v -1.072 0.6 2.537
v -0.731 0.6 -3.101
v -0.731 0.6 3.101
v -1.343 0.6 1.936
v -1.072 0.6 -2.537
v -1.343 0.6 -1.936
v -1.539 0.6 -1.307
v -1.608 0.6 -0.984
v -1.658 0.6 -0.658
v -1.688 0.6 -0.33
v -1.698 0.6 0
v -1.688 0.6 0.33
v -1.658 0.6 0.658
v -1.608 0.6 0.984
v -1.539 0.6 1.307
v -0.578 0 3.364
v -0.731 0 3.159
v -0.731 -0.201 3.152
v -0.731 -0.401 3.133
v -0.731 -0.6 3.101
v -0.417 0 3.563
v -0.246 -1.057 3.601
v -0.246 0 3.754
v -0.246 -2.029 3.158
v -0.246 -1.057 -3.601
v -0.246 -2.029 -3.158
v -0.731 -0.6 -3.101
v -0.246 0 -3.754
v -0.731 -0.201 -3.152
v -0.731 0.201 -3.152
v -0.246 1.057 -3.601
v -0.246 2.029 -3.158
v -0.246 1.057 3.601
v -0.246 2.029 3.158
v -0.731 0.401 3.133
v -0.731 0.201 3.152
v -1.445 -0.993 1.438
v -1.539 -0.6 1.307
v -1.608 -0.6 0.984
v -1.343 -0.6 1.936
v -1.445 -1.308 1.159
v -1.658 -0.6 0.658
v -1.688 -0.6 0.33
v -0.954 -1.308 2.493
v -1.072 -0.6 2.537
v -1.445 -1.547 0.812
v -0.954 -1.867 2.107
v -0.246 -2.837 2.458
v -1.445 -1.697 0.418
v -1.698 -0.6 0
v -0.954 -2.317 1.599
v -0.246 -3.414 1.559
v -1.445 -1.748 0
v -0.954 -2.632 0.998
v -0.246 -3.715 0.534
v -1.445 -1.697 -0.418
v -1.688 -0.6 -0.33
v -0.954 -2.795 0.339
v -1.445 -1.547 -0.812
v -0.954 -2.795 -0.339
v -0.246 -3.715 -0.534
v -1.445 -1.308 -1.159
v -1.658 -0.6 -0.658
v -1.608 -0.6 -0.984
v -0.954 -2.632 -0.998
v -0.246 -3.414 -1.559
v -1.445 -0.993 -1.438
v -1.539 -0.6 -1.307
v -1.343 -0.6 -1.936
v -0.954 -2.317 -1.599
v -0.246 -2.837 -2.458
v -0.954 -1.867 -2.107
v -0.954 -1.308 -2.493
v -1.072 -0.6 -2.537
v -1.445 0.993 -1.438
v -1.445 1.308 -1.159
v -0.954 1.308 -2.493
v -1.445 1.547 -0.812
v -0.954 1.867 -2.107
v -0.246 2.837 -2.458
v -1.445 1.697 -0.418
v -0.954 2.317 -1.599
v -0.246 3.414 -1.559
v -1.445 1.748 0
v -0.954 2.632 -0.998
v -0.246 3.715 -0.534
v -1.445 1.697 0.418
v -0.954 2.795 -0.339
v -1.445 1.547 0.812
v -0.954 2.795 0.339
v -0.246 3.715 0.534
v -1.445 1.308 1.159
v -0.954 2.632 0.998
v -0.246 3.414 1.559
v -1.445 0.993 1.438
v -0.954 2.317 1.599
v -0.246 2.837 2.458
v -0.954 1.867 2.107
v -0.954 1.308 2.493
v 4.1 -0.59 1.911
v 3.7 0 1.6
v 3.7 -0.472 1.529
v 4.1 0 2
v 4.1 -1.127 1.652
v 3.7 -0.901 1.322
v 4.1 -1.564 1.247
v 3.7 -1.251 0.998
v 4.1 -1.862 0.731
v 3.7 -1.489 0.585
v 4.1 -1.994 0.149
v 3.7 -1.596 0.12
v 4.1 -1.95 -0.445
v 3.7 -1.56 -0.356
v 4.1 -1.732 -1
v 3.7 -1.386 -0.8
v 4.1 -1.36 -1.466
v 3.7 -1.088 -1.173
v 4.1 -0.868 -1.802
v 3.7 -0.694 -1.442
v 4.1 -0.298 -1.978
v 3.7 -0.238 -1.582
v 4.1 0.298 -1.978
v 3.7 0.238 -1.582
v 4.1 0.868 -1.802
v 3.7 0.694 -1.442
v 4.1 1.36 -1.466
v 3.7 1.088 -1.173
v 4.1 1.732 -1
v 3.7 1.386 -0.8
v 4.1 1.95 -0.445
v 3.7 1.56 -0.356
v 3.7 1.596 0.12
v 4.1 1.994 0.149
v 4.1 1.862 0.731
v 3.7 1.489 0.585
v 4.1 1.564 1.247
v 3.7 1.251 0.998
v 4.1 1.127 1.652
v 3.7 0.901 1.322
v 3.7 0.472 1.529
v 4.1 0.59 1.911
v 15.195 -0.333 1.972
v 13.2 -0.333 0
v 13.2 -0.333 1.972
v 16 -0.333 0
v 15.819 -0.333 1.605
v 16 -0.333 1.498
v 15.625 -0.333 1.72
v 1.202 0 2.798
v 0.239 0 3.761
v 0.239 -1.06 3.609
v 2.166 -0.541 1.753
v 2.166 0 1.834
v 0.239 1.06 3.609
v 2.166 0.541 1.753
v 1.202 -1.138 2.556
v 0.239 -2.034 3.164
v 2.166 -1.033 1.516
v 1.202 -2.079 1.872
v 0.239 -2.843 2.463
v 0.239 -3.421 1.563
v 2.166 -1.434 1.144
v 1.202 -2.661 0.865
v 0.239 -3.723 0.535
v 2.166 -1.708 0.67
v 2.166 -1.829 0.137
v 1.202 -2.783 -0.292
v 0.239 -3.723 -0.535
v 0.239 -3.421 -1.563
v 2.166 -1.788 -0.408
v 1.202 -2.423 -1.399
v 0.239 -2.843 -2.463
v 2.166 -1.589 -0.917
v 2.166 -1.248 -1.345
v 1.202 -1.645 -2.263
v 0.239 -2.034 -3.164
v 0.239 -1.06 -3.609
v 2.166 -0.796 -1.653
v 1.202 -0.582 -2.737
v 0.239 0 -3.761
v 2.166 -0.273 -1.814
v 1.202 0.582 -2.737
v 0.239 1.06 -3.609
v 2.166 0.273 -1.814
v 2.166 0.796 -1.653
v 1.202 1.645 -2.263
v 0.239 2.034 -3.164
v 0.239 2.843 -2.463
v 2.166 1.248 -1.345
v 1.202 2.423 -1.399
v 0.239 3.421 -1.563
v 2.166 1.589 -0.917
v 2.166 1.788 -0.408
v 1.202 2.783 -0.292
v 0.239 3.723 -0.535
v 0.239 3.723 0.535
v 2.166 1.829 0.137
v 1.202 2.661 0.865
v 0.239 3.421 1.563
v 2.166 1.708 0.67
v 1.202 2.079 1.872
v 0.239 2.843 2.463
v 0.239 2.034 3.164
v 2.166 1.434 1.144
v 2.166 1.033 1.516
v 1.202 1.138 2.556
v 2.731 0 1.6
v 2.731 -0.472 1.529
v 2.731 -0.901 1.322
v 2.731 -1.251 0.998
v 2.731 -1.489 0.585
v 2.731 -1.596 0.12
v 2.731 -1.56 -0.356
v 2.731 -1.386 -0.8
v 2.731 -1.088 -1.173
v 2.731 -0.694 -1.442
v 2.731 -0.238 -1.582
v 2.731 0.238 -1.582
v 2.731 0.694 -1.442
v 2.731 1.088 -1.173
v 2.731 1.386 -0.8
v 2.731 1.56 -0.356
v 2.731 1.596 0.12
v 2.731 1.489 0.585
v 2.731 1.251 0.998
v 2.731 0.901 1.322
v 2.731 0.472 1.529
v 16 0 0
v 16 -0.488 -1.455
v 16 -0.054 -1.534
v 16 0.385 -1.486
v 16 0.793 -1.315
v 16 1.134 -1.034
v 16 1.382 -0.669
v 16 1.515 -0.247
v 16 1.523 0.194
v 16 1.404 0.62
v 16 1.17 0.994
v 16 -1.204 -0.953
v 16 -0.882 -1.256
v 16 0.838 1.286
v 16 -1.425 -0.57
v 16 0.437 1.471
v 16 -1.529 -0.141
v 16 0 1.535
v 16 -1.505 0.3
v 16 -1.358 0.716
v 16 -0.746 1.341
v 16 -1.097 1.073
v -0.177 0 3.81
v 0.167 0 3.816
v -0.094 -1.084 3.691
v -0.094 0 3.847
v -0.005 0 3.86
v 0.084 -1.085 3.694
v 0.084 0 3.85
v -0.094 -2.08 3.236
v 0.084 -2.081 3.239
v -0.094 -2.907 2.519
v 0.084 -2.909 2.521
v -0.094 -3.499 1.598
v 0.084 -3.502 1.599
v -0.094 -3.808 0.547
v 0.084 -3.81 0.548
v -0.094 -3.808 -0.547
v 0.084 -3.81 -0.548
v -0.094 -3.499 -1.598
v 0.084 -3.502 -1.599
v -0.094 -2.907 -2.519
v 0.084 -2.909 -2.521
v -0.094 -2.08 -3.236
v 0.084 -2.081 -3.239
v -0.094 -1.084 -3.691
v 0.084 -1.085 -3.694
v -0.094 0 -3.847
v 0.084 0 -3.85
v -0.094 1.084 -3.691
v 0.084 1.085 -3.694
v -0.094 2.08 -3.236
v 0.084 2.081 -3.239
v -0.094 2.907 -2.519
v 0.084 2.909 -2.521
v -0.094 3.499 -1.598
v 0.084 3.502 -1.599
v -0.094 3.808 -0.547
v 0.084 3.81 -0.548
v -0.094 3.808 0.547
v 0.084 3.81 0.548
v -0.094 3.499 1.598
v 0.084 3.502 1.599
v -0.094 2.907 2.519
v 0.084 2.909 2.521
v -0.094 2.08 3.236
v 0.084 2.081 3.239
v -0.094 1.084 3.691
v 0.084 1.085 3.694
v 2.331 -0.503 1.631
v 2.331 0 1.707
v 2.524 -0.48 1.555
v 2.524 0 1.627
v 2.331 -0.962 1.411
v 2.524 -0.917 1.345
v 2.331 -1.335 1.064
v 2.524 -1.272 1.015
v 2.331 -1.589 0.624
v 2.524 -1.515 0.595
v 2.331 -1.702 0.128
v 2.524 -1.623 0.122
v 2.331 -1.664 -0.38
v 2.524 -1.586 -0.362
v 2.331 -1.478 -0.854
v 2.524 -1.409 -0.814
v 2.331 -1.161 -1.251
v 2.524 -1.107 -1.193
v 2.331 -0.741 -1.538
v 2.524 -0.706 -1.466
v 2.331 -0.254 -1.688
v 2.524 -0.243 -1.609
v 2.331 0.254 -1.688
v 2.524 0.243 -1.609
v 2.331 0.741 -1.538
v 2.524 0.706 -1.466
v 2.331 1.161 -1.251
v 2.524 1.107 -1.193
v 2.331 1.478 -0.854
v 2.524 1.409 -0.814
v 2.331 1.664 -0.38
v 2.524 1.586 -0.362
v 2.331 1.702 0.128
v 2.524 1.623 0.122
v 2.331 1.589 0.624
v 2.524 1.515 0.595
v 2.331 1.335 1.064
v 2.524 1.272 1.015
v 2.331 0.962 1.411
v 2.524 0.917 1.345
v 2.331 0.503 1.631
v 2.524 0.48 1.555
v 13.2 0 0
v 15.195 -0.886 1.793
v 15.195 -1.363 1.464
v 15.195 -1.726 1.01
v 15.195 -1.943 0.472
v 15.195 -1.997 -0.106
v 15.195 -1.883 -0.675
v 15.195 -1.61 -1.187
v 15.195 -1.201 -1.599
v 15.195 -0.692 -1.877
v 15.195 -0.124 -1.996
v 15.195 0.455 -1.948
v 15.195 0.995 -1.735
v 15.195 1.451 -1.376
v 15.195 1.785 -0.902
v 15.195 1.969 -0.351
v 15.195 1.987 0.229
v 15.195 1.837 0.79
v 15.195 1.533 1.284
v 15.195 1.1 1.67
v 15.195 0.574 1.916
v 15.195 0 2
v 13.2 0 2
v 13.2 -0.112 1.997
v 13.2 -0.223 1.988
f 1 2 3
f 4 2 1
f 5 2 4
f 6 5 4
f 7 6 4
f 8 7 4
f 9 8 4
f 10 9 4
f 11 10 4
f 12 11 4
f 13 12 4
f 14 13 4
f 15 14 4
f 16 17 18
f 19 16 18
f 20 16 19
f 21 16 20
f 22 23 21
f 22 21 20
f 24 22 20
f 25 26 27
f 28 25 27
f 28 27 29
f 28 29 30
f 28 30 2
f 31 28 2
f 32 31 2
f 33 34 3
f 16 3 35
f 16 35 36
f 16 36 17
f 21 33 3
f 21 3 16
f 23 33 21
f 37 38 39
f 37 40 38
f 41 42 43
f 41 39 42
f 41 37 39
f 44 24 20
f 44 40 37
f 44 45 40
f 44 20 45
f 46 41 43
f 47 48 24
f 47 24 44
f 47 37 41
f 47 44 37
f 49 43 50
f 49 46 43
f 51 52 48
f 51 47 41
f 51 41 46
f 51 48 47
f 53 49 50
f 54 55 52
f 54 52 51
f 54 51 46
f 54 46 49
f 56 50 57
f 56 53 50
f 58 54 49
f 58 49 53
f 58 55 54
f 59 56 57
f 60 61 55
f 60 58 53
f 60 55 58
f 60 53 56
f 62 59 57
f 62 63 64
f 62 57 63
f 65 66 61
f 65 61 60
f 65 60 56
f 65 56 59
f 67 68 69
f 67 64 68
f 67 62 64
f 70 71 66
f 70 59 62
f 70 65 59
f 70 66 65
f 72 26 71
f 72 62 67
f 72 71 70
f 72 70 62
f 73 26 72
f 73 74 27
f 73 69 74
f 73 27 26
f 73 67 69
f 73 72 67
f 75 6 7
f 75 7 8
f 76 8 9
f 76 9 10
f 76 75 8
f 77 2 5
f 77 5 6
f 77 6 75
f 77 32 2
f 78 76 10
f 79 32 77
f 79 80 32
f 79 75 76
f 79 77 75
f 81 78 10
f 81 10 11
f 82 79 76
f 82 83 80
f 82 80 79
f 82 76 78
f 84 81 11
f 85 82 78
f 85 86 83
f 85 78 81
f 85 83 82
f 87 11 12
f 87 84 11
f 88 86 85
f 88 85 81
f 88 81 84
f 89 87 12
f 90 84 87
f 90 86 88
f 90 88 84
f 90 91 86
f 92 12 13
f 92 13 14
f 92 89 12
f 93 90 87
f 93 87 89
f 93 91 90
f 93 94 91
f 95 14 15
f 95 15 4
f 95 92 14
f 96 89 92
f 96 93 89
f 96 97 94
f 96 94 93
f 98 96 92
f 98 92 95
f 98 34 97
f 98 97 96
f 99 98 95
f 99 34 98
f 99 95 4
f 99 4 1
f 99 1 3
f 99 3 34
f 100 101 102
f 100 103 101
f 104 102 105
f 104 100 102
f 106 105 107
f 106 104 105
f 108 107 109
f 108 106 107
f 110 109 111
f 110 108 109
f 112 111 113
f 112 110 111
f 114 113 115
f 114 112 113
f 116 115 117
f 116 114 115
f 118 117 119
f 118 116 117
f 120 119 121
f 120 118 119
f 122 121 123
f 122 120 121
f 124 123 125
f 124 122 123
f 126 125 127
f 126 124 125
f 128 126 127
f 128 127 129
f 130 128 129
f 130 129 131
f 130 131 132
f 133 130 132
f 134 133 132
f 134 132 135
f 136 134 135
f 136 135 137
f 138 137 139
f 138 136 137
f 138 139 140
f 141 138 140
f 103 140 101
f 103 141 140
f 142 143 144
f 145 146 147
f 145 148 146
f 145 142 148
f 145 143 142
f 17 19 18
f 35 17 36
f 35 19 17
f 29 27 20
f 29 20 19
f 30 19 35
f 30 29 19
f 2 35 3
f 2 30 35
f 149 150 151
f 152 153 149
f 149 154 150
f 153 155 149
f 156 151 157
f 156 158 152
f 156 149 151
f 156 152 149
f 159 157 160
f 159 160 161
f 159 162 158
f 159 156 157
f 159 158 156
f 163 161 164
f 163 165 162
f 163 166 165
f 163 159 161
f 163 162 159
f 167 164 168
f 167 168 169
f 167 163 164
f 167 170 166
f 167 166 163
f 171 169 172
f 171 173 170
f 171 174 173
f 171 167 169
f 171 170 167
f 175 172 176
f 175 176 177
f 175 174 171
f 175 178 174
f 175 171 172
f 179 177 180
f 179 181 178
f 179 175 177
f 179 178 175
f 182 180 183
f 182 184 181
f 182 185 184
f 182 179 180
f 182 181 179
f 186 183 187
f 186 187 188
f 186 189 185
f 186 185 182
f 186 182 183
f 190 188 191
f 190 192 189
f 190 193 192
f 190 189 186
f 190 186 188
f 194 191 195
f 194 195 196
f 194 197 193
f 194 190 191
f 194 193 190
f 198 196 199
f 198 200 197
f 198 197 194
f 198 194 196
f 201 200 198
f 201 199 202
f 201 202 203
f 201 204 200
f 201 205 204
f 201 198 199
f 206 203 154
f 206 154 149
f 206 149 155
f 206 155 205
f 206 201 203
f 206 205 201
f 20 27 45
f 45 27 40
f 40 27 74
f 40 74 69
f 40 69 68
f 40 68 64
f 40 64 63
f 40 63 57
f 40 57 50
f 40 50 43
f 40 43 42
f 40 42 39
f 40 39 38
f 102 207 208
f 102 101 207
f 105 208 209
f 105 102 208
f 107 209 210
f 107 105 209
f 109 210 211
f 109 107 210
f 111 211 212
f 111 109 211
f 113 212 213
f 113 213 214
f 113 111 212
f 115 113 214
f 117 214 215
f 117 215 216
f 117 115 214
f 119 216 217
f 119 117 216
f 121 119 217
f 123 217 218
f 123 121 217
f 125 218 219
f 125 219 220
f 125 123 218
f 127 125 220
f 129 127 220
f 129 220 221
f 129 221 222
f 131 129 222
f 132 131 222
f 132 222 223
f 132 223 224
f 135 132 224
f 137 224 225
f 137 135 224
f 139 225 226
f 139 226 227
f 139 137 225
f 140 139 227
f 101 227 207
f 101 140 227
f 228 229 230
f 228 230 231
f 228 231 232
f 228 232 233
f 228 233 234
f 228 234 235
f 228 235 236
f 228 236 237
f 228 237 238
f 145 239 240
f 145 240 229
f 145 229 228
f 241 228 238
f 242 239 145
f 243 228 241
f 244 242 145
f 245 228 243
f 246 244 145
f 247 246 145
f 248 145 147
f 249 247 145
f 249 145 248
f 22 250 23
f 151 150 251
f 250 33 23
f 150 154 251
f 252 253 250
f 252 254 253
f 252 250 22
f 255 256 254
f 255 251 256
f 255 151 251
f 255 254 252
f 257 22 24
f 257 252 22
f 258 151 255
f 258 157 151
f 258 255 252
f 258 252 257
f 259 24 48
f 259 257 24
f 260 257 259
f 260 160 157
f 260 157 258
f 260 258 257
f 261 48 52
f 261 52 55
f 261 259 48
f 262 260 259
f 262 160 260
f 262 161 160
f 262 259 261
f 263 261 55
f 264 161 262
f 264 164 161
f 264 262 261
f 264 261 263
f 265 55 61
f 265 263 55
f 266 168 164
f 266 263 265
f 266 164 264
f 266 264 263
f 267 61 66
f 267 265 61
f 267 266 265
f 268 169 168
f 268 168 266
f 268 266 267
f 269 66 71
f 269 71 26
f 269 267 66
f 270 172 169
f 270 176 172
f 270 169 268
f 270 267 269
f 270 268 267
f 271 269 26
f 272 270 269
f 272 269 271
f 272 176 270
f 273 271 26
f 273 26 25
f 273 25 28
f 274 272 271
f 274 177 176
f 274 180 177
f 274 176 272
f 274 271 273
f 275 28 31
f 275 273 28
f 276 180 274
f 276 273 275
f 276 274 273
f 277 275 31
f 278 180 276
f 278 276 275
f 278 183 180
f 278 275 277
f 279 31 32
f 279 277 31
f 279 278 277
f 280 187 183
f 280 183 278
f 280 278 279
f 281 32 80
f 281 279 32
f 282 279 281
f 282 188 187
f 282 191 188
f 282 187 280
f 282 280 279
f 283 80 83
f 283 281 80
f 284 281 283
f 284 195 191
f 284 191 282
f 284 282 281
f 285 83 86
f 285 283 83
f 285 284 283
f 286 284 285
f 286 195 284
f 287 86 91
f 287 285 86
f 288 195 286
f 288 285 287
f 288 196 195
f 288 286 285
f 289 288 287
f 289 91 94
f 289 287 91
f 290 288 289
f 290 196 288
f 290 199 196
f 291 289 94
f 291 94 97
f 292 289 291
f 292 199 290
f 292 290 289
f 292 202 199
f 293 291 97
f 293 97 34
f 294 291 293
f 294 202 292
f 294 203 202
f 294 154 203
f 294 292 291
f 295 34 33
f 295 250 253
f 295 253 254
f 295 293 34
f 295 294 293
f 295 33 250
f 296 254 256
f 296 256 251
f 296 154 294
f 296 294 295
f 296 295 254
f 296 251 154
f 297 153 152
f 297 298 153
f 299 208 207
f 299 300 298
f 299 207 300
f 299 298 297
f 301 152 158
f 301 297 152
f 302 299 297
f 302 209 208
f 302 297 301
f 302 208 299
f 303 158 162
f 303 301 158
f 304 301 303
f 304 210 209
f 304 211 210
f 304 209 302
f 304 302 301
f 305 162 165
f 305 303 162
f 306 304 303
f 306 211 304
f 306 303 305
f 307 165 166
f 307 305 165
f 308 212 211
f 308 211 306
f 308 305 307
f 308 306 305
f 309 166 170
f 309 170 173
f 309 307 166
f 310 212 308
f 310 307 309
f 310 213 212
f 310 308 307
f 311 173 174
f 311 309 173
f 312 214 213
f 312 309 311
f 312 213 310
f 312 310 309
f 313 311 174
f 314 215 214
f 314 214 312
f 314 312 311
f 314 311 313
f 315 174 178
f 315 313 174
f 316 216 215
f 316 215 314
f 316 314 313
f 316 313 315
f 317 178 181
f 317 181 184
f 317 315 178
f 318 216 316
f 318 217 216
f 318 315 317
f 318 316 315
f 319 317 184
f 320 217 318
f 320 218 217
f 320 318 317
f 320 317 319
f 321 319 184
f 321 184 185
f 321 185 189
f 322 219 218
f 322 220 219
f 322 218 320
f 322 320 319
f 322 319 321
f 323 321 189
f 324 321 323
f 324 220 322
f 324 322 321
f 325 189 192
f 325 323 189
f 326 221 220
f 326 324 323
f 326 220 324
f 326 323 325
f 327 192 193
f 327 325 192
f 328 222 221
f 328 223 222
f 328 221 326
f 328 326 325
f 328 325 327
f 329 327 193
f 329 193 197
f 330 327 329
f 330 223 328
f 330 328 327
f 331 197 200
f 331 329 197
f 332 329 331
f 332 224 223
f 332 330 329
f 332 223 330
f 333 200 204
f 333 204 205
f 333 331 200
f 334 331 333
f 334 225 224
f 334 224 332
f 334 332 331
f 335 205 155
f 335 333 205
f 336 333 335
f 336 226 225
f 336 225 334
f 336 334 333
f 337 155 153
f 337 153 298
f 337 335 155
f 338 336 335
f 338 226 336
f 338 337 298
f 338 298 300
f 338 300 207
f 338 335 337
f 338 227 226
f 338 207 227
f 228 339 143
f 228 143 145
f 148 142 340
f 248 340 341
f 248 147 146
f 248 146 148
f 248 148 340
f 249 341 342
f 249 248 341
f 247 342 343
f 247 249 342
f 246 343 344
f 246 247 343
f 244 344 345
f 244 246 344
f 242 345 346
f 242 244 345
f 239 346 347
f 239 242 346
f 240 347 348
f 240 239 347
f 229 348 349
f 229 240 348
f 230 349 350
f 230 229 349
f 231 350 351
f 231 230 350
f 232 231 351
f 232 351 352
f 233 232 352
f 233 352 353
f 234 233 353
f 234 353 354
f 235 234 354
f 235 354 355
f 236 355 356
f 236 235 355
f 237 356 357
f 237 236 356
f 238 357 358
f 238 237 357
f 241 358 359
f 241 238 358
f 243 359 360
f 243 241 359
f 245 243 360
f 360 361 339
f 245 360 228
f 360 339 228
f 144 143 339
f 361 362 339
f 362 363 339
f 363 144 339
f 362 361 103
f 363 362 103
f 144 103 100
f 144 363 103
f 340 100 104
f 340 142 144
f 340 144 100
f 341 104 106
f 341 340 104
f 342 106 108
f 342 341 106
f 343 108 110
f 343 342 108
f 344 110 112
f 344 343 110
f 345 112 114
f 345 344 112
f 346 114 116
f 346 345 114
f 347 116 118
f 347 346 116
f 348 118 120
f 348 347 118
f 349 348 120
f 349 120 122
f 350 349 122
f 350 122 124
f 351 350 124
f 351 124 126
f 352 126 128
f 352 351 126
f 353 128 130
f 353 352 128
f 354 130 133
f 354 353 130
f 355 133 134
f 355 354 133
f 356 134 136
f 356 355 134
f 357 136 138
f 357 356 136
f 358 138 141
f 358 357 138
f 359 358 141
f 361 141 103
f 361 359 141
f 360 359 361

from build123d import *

# Parameters (mm, degrees)
SLOT_CUT_EXTRUDE1_DEPTH      = 17.90568942
SLOT_CUT_EXTRUDE1_DEPTH_BACK = 17.90568942
SKETCH2_W                    = 1
SKETCH2_H                    = 1.2
SKETCH11_W                   = 2.8
SKETCH11_H                   = 0.333333333
POINT_CUT_EXTRUDE8_DEPTH     = 17.90568942


with BuildPart() as part:
    # Sketch1 → base-Revolve (revolve)
    with BuildSketch(Plane.XY, mode=Mode.PRIVATE) as base_revolve_sk:
        with BuildLine():
            Line((0.238648539, 3.761351461), (2.165685425, 1.834314575))
            ThreePointArc((2.165685425, 1.834314575), (2.425224104, 1.660896374), (2.73137085, 1.6))
            Line((2.73137085, 1.6), (3.7, 1.6))
            Line((3.7, 1.6), (4.1, 2))
            Line((4.1, 2), (16, 2))
            Line((16, 2), (16, 0))
            Line((16, 0), (0, 0))
            Line((0, 0), (-1.730540111, 0))
            ThreePointArc((-1.730540111, 0), (-1.345987021, 2.01818082), (-0.246219246, 3.753532584))
            ThreePointArc((-0.246219246, 3.753532584), (-0.005441747, 3.860159049), (0.238648539, 3.761351461))
        make_face()
    revolve(base_revolve_sk.sketch.rotate(Axis((0, 0, 0), (1, 0, 0)), 90), axis=Axis((0, 0, 0), (1, 0, 0)))

    # Sketch2 → slot_Cut-Extrude1 (cut, two sides: drawn at the far end of the back side and taken through both)
    with BuildSketch(Plane.XY.offset(-SLOT_CUT_EXTRUDE1_DEPTH_BACK)):
        with Locations((-1.230540111, 0)):
            Rectangle(SKETCH2_W, SKETCH2_H)
    extrude(amount=SLOT_CUT_EXTRUDE1_DEPTH + SLOT_CUT_EXTRUDE1_DEPTH_BACK, mode=Mode.SUBTRACT)

    # Sketch8 → point_Cut-Revolve1 (revolve, cut)
    with BuildSketch(Plane.XY, mode=Mode.PRIVATE) as point_cut_revolve1_sk:
        Polygon((16, 0), (16.508, 0), (16.508, 2.508), (15.194596374, 2.508), (15.194596374, 2), (16, 1.535), align=None)
    revolve(point_cut_revolve1_sk.sketch.rotate(Axis((0, 0, 0), (1, 0, 0)), 90), axis=Axis((0, 0, 0), (1, 0, 0)), mode=Mode.SUBTRACT)

    # Sketch11 → point_Cut-Extrude8 (cut, through all)
    with BuildSketch(Plane.XY):
        with Locations((14.6, -0.166666667)):
            Rectangle(SKETCH11_W, SKETCH11_H)
    extrude(amount=POINT_CUT_EXTRUDE8_DEPTH, mode=Mode.SUBTRACT)


solid = part.part
